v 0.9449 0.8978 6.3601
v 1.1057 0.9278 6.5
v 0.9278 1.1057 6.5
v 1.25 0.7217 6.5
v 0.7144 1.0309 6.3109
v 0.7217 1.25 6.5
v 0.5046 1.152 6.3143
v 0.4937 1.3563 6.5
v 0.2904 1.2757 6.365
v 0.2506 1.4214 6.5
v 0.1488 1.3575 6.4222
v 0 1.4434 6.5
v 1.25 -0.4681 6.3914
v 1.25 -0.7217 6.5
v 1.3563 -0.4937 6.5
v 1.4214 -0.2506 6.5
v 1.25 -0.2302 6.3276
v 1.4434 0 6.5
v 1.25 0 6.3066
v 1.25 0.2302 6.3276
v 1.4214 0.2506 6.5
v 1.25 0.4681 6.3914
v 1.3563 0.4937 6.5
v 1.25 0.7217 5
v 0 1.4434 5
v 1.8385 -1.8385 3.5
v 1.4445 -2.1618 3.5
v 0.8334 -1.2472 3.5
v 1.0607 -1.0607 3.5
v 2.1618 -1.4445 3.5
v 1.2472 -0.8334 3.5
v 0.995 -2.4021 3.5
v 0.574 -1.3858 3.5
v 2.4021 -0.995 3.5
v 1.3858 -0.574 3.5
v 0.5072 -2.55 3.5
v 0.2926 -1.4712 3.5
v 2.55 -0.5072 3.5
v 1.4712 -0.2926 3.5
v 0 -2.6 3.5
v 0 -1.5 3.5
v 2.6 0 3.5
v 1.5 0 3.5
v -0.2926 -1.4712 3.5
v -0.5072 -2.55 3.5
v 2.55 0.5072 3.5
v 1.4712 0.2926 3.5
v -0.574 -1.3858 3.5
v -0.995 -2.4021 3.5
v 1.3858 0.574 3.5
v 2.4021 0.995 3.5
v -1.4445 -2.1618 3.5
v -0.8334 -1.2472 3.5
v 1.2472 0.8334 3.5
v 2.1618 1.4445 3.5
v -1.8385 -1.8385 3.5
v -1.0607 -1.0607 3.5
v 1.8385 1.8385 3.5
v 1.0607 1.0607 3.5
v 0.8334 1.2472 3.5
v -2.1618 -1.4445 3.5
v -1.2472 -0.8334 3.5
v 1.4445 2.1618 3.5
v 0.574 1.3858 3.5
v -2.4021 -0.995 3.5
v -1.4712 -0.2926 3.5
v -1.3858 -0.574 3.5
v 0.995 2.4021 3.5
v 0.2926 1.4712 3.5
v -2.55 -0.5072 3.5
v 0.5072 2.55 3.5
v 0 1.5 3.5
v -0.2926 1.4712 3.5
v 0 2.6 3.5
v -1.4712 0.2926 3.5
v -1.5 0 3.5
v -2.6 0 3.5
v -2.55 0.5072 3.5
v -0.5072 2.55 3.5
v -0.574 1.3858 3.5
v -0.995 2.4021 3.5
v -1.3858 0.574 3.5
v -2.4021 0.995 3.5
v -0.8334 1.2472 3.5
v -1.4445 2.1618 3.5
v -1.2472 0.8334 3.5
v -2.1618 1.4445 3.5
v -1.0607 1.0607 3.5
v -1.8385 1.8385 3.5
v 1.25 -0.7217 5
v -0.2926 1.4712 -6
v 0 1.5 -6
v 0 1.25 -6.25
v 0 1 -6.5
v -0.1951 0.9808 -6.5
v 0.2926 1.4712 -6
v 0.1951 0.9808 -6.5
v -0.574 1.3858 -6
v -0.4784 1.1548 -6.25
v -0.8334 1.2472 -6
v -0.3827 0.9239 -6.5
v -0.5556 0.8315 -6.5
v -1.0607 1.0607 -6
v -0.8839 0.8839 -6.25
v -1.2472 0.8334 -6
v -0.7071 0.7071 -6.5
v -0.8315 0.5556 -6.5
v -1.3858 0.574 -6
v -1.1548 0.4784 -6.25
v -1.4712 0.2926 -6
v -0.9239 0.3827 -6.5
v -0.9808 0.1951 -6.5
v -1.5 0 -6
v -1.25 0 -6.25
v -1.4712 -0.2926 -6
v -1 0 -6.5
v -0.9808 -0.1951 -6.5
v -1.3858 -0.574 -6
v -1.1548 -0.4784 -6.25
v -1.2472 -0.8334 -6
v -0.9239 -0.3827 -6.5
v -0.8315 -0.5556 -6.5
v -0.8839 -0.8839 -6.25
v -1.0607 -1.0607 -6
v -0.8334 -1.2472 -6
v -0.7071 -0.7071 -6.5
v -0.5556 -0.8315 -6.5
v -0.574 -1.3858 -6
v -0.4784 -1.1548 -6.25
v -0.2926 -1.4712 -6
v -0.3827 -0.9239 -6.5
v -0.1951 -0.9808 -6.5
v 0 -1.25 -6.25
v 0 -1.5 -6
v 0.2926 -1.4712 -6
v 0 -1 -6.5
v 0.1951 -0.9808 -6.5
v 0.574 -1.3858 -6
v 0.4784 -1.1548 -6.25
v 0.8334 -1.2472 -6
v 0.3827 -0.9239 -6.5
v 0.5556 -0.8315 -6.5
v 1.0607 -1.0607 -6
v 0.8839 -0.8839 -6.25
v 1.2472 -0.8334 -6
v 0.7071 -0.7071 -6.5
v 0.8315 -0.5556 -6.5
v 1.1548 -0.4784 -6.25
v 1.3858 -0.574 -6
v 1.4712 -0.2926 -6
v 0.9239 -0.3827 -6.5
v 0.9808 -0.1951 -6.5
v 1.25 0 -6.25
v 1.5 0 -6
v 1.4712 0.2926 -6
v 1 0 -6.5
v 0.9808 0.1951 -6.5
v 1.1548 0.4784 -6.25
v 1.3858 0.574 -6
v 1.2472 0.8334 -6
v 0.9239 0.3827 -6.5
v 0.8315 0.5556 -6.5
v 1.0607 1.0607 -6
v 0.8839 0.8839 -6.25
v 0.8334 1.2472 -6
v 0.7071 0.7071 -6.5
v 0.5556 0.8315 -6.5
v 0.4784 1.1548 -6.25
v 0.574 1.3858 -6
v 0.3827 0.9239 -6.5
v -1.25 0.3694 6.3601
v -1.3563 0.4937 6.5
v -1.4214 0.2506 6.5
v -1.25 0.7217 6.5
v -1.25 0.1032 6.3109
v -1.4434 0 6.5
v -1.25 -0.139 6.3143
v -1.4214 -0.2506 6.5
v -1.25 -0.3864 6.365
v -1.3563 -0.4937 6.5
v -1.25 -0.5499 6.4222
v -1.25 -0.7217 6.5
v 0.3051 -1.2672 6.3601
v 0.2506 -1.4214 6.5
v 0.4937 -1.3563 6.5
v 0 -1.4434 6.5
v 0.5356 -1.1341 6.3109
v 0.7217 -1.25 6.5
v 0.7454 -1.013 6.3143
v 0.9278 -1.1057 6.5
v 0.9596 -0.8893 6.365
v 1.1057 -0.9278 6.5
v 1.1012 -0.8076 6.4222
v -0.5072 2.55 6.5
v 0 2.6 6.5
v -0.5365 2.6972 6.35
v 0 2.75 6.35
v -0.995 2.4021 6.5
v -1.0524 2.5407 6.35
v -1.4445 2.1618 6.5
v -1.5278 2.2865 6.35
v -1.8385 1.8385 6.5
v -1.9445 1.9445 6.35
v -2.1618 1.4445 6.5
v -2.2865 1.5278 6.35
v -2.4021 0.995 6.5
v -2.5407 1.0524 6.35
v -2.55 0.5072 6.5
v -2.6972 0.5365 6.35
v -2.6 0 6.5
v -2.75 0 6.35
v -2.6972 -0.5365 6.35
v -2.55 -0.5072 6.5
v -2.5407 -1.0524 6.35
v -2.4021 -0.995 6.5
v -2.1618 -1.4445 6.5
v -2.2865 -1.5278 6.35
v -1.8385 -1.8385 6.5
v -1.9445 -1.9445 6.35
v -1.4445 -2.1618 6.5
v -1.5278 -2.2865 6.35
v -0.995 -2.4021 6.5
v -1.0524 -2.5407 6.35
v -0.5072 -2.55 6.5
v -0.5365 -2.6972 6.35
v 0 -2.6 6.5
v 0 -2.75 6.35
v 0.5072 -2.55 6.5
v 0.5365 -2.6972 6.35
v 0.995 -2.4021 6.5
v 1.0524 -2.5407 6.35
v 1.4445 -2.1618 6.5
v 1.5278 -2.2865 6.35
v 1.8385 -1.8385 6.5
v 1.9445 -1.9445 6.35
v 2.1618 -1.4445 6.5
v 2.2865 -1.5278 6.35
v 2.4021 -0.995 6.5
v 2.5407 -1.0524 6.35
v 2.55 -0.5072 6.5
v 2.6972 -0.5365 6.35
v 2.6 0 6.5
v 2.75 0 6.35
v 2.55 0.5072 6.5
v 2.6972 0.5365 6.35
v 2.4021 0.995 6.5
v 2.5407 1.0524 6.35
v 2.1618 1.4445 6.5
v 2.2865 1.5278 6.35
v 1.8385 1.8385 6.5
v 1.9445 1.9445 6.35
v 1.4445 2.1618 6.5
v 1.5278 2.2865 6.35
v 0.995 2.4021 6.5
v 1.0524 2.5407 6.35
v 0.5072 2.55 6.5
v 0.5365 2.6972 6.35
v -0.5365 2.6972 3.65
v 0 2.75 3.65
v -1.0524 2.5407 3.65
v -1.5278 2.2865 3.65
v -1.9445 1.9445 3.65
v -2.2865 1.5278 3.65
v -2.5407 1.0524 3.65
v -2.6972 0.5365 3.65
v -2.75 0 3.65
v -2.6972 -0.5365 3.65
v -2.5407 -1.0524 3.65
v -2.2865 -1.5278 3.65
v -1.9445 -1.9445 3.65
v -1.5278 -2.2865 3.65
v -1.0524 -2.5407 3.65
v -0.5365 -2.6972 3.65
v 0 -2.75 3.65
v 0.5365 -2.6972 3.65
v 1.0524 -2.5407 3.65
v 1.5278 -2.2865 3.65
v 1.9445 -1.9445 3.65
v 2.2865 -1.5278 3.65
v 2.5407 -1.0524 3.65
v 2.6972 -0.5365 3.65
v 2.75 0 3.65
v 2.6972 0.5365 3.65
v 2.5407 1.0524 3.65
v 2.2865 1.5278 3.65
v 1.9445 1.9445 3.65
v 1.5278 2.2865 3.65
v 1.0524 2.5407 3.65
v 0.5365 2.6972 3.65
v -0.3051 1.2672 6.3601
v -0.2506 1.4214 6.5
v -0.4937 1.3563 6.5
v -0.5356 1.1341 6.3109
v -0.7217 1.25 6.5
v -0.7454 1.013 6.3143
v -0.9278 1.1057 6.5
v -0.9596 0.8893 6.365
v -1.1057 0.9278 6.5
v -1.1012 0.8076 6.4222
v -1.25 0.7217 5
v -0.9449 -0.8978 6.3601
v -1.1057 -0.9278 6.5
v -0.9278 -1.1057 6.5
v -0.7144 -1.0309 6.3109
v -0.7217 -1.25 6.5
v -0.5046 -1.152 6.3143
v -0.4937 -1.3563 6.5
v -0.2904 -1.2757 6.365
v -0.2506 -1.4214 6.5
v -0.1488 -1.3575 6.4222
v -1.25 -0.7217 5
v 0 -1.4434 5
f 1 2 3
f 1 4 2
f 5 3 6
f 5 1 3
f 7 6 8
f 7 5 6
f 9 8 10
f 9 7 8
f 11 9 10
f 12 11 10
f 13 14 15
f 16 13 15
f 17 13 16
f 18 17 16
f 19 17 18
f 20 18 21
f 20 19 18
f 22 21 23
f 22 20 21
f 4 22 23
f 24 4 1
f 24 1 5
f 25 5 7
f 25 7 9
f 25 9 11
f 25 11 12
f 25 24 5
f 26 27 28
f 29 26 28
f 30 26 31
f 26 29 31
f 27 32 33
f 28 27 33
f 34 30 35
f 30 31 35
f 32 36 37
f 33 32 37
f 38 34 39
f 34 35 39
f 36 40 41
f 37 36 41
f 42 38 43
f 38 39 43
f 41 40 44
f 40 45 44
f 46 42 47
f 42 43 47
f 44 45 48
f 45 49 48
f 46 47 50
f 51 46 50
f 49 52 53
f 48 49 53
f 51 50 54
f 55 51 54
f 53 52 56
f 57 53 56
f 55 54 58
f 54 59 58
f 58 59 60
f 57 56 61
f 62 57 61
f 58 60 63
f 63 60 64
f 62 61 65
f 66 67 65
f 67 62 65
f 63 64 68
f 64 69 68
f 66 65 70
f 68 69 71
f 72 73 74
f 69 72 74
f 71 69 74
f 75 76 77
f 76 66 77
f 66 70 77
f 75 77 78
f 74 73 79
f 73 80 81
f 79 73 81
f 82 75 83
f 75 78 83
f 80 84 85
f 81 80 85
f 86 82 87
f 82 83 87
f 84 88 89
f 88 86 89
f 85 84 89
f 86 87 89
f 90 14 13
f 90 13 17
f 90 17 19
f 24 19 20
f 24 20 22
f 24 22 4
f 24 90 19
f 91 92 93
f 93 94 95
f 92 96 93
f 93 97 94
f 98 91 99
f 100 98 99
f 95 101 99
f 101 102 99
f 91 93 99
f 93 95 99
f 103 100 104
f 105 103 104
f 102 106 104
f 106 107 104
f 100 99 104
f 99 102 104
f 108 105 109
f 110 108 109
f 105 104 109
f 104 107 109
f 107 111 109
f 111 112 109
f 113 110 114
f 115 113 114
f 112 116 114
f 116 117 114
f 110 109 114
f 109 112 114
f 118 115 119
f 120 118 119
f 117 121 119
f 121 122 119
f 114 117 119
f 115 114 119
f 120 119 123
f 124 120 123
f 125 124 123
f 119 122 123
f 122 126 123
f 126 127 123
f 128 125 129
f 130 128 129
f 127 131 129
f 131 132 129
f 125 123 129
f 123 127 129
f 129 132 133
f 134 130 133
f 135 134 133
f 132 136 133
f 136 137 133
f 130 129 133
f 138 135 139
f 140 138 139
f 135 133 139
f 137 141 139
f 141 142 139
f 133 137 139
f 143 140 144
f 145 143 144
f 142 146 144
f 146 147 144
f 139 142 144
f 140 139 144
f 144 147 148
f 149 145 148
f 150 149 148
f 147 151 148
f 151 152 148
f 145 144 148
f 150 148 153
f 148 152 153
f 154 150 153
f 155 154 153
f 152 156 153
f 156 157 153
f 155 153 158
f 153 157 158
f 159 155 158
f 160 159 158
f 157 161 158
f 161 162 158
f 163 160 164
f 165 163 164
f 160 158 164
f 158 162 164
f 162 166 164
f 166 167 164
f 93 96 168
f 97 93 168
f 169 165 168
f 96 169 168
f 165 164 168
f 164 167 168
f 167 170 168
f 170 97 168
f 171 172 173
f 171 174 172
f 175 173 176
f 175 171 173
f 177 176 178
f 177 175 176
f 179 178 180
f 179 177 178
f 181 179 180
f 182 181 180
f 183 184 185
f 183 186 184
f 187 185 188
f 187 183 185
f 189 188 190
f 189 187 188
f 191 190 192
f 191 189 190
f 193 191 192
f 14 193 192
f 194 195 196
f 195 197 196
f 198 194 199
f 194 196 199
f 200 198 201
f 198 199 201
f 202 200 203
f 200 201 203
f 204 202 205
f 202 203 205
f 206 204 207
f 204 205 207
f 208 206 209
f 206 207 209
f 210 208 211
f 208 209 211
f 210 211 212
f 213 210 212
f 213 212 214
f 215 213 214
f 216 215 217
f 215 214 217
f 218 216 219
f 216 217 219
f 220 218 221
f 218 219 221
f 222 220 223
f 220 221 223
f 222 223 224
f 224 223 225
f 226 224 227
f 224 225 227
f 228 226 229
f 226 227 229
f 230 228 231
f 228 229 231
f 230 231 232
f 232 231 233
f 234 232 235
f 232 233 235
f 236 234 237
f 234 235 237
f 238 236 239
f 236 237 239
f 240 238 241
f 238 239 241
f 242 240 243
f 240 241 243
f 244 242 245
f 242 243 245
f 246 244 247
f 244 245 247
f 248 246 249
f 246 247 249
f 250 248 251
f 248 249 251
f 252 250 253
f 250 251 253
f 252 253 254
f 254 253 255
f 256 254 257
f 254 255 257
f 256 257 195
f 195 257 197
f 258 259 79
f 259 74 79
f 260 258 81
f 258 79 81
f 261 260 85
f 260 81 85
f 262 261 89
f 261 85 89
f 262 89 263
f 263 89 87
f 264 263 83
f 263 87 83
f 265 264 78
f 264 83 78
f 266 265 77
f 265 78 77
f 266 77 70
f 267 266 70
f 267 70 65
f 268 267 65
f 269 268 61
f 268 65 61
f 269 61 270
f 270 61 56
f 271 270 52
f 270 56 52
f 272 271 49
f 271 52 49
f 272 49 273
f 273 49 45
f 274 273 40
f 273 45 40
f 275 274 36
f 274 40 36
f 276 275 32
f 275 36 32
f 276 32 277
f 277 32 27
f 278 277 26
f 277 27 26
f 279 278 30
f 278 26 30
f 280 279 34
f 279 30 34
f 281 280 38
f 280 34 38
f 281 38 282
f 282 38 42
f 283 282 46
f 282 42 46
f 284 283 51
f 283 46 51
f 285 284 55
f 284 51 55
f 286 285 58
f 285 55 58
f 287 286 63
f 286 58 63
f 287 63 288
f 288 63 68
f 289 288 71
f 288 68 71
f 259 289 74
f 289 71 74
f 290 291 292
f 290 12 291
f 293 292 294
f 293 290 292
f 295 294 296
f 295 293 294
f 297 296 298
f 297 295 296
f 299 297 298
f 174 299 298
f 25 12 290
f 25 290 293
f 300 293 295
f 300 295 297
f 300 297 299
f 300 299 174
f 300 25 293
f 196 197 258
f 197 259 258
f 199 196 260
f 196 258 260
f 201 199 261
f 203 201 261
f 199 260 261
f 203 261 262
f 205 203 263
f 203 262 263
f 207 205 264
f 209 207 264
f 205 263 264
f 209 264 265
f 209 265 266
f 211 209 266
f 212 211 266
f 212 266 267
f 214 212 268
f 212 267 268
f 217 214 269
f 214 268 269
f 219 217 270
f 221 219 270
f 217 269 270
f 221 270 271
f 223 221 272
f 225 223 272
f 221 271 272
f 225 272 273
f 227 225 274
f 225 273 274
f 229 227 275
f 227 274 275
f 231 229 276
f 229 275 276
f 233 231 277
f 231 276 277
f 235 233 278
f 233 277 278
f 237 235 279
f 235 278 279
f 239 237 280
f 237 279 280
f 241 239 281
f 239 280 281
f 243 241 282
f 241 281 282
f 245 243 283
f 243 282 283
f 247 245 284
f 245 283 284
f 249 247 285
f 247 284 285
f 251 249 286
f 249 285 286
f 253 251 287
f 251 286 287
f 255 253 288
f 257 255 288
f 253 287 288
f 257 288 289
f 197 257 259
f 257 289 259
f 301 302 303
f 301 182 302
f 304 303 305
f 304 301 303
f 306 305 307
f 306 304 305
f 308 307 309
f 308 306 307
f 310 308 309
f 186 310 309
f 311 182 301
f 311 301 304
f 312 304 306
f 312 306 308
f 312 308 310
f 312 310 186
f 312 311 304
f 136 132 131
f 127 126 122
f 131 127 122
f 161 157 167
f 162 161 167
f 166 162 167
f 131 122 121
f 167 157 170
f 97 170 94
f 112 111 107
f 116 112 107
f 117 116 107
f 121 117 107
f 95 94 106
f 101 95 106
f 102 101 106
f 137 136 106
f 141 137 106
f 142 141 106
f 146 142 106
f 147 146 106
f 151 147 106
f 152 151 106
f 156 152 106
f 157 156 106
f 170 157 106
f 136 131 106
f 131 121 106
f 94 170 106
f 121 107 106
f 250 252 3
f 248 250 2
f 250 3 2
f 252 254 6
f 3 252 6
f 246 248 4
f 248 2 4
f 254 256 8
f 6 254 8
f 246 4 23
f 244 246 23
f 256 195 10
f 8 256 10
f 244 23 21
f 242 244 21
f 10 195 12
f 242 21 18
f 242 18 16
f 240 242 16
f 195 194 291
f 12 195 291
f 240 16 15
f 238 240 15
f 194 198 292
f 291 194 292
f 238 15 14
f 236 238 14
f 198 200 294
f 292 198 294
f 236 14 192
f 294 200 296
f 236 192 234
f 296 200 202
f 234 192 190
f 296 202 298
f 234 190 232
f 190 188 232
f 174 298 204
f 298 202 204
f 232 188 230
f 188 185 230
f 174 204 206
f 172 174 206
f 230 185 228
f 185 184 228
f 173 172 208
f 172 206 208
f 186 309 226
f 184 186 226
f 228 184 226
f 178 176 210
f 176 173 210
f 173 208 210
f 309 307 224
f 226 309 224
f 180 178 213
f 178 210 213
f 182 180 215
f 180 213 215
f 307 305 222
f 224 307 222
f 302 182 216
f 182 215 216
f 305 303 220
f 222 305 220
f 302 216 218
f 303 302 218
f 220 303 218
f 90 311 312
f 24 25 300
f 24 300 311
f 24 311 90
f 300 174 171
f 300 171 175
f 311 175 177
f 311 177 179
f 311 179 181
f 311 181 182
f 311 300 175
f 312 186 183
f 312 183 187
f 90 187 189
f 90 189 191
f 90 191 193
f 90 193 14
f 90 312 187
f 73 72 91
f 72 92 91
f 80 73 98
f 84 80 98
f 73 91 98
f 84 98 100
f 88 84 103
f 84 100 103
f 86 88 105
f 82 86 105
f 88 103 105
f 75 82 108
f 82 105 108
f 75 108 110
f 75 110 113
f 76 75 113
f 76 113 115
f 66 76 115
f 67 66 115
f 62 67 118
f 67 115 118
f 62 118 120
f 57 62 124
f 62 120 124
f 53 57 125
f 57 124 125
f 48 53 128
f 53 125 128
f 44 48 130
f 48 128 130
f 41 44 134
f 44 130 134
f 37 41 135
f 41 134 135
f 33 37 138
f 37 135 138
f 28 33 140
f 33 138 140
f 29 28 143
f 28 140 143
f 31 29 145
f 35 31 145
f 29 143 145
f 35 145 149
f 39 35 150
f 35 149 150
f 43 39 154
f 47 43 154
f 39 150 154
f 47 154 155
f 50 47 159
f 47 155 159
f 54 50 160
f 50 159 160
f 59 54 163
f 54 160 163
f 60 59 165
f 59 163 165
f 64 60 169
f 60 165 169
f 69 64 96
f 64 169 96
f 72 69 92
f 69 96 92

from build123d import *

# Parameters (mm, degrees)
CUT_EXTRUDE1_START = -1.5
CUT_EXTRUDE1_DEPTH = 1.5
SKETCH4_R          = 1.443375673
CUT_EXTRUDE2_DEPTH = 0.5
CUT_EXTRUDE2_TAPER = 45


with BuildPart() as part:
    # Sketch2 → Revolve1 (revolve)
    with BuildSketch(Plane(origin=(0, 0, 0), x_dir=(0, 0, -1), z_dir=(1, 0, 0))):
        Polygon((-6.35, 2.75), (-3.65, 2.75), (-3.5, 2.6), (-3.5, 1.5), (6, 1.5), (6.5, 1), (6.5, 0), (-6.5, 0), (-6.5, 2.6), align=None)
    revolve(axis=Axis((0, 0, -6.5), (0, 0, 1)))

    # Sketch3 → Cut-Extrude1 (cut)
    with BuildSketch(Plane.XY.offset(6.5).offset(CUT_EXTRUDE1_START)):
        Polygon((0, 1.443375673), (-1.25, 0.721687836), (-1.25, -0.721687836), (0, -1.443375673), (1.25, -0.721687836), (1.25, 0.721687836), align=None)
    extrude(amount=CUT_EXTRUDE1_DEPTH, mode=Mode.SUBTRACT)

    # Sketch4 → Cut-Extrude2 (cut)
    with BuildSketch(Plane.XY.offset(6.5)):
        Circle(SKETCH4_R)
    extrude(amount=-CUT_EXTRUDE2_DEPTH, taper=CUT_EXTRUDE2_TAPER, mode=Mode.SUBTRACT)


solid = part.part
